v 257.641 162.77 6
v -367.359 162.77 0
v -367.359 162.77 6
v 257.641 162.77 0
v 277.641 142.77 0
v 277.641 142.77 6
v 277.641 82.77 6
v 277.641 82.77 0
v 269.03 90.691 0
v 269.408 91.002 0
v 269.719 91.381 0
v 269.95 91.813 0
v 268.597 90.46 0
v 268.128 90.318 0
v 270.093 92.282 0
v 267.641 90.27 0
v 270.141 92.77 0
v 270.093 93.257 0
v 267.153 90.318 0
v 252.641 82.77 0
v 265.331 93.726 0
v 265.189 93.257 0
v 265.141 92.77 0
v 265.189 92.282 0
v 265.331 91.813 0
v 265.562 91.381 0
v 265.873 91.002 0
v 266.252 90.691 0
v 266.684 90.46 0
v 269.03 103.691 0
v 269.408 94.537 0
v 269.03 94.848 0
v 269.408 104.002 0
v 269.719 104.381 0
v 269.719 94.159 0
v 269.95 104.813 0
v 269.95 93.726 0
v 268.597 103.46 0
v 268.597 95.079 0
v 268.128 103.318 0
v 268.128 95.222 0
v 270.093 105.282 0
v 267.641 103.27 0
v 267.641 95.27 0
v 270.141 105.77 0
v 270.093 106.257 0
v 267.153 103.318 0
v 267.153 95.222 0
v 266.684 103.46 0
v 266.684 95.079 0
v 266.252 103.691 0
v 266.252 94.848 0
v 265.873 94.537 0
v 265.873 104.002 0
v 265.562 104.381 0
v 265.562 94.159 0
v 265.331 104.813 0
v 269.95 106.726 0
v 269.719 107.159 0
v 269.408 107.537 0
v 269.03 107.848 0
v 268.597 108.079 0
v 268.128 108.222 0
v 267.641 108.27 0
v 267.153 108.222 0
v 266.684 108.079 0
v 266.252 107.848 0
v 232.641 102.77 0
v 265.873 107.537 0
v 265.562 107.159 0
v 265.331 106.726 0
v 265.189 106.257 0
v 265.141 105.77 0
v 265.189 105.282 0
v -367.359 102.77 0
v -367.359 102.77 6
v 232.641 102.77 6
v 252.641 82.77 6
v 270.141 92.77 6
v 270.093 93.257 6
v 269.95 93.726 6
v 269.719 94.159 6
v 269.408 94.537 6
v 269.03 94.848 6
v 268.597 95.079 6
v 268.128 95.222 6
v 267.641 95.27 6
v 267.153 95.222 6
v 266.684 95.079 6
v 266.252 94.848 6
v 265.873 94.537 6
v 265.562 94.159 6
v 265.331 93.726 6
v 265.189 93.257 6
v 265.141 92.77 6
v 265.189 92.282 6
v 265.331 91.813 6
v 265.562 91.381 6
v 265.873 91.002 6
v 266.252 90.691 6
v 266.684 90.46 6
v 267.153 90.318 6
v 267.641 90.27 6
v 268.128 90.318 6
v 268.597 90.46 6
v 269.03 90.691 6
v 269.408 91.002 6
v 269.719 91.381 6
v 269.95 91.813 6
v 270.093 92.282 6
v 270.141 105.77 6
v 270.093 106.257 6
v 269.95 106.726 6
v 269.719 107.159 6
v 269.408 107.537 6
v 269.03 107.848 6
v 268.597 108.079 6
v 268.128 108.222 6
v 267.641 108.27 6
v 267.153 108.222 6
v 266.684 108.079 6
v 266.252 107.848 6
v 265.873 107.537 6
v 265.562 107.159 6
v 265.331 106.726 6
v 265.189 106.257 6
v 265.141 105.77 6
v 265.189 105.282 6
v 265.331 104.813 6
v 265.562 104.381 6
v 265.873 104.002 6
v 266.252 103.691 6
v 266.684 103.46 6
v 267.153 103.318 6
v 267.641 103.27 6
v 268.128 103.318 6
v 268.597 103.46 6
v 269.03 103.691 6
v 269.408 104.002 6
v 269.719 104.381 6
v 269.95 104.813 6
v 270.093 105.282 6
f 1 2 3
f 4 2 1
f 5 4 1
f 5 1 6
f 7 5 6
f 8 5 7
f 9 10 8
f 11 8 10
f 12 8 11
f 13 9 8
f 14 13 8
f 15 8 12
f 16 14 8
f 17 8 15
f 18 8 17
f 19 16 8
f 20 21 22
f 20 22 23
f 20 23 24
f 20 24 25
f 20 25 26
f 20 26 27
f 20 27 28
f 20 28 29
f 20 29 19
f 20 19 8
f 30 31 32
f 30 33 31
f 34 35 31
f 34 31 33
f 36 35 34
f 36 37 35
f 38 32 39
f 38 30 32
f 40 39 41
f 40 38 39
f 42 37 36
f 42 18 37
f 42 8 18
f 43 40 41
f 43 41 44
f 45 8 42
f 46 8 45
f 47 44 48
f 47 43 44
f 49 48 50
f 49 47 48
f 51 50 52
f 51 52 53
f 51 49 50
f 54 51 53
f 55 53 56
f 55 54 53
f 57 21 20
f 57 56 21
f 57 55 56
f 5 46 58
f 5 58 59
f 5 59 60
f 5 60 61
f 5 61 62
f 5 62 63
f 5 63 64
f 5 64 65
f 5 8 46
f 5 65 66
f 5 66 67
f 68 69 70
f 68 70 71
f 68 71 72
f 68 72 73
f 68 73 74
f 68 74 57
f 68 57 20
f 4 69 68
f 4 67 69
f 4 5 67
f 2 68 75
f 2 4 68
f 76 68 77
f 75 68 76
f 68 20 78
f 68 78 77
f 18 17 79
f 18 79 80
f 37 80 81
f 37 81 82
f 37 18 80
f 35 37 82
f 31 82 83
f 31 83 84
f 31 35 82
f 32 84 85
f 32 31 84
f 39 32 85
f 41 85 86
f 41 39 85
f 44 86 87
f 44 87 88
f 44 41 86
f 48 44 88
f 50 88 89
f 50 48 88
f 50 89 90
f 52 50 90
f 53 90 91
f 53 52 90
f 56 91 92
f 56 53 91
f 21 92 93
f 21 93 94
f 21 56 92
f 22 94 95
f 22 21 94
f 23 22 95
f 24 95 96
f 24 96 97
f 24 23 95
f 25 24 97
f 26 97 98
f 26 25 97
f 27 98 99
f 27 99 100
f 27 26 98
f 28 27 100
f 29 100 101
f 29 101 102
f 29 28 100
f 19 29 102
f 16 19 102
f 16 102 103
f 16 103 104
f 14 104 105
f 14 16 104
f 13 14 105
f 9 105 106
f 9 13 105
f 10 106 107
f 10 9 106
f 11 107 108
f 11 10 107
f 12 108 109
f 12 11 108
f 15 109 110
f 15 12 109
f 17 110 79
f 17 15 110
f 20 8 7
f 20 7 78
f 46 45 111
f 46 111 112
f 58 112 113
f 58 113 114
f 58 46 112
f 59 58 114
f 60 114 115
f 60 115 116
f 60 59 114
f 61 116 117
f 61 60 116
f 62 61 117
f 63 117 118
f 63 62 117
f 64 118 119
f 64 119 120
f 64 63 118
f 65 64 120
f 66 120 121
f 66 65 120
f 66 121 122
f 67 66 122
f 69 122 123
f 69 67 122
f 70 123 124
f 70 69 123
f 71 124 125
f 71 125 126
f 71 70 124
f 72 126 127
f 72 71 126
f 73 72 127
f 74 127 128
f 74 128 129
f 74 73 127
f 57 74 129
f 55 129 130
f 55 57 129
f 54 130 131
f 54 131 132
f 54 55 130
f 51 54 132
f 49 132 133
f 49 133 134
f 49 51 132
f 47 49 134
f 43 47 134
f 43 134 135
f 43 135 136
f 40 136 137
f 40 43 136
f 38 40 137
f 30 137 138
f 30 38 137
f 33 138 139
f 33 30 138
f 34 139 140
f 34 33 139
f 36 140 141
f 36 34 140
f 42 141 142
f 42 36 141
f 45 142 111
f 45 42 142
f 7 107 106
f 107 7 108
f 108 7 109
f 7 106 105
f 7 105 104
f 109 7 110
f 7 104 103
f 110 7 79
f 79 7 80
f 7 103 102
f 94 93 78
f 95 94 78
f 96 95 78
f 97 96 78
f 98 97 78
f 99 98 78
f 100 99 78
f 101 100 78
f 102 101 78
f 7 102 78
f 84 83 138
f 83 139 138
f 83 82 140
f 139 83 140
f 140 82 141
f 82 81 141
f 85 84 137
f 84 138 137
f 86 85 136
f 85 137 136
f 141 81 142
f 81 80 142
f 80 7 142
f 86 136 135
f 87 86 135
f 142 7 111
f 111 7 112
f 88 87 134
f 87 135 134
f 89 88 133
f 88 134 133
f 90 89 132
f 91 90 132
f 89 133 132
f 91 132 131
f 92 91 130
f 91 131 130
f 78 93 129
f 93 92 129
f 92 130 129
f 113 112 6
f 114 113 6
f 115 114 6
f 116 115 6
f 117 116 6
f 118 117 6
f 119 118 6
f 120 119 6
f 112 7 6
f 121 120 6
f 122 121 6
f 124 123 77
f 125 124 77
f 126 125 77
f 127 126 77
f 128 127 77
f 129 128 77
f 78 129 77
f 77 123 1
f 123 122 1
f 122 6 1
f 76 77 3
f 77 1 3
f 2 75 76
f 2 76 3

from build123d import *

# Parameters (mm, degrees)
SKETCH1_R           = 2.5
BOSS_EXTRUDE1_DEPTH = 6


with BuildPart() as part:
    # Sketch1 → Boss-Extrude1 (new body)
    with BuildSketch(Plane.XY):
        Polygon((257.640643246, 162.769630368), (277.640643246, 142.769630368), (277.640643246, 82.769630368), (252.640643246, 82.769630368), (232.640643246, 102.769630368), (-367.359356754, 102.769630368), (-367.359356754, 162.769630368), align=None)
        with Locations((267.640643246, 105.769630368)):
            Circle(SKETCH1_R, mode=Mode.SUBTRACT)
        with Locations((267.640643246, 92.769630368)):
            Circle(SKETCH1_R, mode=Mode.SUBTRACT)
    extrude(amount=BOSS_EXTRUDE1_DEPTH)


solid = part.part
